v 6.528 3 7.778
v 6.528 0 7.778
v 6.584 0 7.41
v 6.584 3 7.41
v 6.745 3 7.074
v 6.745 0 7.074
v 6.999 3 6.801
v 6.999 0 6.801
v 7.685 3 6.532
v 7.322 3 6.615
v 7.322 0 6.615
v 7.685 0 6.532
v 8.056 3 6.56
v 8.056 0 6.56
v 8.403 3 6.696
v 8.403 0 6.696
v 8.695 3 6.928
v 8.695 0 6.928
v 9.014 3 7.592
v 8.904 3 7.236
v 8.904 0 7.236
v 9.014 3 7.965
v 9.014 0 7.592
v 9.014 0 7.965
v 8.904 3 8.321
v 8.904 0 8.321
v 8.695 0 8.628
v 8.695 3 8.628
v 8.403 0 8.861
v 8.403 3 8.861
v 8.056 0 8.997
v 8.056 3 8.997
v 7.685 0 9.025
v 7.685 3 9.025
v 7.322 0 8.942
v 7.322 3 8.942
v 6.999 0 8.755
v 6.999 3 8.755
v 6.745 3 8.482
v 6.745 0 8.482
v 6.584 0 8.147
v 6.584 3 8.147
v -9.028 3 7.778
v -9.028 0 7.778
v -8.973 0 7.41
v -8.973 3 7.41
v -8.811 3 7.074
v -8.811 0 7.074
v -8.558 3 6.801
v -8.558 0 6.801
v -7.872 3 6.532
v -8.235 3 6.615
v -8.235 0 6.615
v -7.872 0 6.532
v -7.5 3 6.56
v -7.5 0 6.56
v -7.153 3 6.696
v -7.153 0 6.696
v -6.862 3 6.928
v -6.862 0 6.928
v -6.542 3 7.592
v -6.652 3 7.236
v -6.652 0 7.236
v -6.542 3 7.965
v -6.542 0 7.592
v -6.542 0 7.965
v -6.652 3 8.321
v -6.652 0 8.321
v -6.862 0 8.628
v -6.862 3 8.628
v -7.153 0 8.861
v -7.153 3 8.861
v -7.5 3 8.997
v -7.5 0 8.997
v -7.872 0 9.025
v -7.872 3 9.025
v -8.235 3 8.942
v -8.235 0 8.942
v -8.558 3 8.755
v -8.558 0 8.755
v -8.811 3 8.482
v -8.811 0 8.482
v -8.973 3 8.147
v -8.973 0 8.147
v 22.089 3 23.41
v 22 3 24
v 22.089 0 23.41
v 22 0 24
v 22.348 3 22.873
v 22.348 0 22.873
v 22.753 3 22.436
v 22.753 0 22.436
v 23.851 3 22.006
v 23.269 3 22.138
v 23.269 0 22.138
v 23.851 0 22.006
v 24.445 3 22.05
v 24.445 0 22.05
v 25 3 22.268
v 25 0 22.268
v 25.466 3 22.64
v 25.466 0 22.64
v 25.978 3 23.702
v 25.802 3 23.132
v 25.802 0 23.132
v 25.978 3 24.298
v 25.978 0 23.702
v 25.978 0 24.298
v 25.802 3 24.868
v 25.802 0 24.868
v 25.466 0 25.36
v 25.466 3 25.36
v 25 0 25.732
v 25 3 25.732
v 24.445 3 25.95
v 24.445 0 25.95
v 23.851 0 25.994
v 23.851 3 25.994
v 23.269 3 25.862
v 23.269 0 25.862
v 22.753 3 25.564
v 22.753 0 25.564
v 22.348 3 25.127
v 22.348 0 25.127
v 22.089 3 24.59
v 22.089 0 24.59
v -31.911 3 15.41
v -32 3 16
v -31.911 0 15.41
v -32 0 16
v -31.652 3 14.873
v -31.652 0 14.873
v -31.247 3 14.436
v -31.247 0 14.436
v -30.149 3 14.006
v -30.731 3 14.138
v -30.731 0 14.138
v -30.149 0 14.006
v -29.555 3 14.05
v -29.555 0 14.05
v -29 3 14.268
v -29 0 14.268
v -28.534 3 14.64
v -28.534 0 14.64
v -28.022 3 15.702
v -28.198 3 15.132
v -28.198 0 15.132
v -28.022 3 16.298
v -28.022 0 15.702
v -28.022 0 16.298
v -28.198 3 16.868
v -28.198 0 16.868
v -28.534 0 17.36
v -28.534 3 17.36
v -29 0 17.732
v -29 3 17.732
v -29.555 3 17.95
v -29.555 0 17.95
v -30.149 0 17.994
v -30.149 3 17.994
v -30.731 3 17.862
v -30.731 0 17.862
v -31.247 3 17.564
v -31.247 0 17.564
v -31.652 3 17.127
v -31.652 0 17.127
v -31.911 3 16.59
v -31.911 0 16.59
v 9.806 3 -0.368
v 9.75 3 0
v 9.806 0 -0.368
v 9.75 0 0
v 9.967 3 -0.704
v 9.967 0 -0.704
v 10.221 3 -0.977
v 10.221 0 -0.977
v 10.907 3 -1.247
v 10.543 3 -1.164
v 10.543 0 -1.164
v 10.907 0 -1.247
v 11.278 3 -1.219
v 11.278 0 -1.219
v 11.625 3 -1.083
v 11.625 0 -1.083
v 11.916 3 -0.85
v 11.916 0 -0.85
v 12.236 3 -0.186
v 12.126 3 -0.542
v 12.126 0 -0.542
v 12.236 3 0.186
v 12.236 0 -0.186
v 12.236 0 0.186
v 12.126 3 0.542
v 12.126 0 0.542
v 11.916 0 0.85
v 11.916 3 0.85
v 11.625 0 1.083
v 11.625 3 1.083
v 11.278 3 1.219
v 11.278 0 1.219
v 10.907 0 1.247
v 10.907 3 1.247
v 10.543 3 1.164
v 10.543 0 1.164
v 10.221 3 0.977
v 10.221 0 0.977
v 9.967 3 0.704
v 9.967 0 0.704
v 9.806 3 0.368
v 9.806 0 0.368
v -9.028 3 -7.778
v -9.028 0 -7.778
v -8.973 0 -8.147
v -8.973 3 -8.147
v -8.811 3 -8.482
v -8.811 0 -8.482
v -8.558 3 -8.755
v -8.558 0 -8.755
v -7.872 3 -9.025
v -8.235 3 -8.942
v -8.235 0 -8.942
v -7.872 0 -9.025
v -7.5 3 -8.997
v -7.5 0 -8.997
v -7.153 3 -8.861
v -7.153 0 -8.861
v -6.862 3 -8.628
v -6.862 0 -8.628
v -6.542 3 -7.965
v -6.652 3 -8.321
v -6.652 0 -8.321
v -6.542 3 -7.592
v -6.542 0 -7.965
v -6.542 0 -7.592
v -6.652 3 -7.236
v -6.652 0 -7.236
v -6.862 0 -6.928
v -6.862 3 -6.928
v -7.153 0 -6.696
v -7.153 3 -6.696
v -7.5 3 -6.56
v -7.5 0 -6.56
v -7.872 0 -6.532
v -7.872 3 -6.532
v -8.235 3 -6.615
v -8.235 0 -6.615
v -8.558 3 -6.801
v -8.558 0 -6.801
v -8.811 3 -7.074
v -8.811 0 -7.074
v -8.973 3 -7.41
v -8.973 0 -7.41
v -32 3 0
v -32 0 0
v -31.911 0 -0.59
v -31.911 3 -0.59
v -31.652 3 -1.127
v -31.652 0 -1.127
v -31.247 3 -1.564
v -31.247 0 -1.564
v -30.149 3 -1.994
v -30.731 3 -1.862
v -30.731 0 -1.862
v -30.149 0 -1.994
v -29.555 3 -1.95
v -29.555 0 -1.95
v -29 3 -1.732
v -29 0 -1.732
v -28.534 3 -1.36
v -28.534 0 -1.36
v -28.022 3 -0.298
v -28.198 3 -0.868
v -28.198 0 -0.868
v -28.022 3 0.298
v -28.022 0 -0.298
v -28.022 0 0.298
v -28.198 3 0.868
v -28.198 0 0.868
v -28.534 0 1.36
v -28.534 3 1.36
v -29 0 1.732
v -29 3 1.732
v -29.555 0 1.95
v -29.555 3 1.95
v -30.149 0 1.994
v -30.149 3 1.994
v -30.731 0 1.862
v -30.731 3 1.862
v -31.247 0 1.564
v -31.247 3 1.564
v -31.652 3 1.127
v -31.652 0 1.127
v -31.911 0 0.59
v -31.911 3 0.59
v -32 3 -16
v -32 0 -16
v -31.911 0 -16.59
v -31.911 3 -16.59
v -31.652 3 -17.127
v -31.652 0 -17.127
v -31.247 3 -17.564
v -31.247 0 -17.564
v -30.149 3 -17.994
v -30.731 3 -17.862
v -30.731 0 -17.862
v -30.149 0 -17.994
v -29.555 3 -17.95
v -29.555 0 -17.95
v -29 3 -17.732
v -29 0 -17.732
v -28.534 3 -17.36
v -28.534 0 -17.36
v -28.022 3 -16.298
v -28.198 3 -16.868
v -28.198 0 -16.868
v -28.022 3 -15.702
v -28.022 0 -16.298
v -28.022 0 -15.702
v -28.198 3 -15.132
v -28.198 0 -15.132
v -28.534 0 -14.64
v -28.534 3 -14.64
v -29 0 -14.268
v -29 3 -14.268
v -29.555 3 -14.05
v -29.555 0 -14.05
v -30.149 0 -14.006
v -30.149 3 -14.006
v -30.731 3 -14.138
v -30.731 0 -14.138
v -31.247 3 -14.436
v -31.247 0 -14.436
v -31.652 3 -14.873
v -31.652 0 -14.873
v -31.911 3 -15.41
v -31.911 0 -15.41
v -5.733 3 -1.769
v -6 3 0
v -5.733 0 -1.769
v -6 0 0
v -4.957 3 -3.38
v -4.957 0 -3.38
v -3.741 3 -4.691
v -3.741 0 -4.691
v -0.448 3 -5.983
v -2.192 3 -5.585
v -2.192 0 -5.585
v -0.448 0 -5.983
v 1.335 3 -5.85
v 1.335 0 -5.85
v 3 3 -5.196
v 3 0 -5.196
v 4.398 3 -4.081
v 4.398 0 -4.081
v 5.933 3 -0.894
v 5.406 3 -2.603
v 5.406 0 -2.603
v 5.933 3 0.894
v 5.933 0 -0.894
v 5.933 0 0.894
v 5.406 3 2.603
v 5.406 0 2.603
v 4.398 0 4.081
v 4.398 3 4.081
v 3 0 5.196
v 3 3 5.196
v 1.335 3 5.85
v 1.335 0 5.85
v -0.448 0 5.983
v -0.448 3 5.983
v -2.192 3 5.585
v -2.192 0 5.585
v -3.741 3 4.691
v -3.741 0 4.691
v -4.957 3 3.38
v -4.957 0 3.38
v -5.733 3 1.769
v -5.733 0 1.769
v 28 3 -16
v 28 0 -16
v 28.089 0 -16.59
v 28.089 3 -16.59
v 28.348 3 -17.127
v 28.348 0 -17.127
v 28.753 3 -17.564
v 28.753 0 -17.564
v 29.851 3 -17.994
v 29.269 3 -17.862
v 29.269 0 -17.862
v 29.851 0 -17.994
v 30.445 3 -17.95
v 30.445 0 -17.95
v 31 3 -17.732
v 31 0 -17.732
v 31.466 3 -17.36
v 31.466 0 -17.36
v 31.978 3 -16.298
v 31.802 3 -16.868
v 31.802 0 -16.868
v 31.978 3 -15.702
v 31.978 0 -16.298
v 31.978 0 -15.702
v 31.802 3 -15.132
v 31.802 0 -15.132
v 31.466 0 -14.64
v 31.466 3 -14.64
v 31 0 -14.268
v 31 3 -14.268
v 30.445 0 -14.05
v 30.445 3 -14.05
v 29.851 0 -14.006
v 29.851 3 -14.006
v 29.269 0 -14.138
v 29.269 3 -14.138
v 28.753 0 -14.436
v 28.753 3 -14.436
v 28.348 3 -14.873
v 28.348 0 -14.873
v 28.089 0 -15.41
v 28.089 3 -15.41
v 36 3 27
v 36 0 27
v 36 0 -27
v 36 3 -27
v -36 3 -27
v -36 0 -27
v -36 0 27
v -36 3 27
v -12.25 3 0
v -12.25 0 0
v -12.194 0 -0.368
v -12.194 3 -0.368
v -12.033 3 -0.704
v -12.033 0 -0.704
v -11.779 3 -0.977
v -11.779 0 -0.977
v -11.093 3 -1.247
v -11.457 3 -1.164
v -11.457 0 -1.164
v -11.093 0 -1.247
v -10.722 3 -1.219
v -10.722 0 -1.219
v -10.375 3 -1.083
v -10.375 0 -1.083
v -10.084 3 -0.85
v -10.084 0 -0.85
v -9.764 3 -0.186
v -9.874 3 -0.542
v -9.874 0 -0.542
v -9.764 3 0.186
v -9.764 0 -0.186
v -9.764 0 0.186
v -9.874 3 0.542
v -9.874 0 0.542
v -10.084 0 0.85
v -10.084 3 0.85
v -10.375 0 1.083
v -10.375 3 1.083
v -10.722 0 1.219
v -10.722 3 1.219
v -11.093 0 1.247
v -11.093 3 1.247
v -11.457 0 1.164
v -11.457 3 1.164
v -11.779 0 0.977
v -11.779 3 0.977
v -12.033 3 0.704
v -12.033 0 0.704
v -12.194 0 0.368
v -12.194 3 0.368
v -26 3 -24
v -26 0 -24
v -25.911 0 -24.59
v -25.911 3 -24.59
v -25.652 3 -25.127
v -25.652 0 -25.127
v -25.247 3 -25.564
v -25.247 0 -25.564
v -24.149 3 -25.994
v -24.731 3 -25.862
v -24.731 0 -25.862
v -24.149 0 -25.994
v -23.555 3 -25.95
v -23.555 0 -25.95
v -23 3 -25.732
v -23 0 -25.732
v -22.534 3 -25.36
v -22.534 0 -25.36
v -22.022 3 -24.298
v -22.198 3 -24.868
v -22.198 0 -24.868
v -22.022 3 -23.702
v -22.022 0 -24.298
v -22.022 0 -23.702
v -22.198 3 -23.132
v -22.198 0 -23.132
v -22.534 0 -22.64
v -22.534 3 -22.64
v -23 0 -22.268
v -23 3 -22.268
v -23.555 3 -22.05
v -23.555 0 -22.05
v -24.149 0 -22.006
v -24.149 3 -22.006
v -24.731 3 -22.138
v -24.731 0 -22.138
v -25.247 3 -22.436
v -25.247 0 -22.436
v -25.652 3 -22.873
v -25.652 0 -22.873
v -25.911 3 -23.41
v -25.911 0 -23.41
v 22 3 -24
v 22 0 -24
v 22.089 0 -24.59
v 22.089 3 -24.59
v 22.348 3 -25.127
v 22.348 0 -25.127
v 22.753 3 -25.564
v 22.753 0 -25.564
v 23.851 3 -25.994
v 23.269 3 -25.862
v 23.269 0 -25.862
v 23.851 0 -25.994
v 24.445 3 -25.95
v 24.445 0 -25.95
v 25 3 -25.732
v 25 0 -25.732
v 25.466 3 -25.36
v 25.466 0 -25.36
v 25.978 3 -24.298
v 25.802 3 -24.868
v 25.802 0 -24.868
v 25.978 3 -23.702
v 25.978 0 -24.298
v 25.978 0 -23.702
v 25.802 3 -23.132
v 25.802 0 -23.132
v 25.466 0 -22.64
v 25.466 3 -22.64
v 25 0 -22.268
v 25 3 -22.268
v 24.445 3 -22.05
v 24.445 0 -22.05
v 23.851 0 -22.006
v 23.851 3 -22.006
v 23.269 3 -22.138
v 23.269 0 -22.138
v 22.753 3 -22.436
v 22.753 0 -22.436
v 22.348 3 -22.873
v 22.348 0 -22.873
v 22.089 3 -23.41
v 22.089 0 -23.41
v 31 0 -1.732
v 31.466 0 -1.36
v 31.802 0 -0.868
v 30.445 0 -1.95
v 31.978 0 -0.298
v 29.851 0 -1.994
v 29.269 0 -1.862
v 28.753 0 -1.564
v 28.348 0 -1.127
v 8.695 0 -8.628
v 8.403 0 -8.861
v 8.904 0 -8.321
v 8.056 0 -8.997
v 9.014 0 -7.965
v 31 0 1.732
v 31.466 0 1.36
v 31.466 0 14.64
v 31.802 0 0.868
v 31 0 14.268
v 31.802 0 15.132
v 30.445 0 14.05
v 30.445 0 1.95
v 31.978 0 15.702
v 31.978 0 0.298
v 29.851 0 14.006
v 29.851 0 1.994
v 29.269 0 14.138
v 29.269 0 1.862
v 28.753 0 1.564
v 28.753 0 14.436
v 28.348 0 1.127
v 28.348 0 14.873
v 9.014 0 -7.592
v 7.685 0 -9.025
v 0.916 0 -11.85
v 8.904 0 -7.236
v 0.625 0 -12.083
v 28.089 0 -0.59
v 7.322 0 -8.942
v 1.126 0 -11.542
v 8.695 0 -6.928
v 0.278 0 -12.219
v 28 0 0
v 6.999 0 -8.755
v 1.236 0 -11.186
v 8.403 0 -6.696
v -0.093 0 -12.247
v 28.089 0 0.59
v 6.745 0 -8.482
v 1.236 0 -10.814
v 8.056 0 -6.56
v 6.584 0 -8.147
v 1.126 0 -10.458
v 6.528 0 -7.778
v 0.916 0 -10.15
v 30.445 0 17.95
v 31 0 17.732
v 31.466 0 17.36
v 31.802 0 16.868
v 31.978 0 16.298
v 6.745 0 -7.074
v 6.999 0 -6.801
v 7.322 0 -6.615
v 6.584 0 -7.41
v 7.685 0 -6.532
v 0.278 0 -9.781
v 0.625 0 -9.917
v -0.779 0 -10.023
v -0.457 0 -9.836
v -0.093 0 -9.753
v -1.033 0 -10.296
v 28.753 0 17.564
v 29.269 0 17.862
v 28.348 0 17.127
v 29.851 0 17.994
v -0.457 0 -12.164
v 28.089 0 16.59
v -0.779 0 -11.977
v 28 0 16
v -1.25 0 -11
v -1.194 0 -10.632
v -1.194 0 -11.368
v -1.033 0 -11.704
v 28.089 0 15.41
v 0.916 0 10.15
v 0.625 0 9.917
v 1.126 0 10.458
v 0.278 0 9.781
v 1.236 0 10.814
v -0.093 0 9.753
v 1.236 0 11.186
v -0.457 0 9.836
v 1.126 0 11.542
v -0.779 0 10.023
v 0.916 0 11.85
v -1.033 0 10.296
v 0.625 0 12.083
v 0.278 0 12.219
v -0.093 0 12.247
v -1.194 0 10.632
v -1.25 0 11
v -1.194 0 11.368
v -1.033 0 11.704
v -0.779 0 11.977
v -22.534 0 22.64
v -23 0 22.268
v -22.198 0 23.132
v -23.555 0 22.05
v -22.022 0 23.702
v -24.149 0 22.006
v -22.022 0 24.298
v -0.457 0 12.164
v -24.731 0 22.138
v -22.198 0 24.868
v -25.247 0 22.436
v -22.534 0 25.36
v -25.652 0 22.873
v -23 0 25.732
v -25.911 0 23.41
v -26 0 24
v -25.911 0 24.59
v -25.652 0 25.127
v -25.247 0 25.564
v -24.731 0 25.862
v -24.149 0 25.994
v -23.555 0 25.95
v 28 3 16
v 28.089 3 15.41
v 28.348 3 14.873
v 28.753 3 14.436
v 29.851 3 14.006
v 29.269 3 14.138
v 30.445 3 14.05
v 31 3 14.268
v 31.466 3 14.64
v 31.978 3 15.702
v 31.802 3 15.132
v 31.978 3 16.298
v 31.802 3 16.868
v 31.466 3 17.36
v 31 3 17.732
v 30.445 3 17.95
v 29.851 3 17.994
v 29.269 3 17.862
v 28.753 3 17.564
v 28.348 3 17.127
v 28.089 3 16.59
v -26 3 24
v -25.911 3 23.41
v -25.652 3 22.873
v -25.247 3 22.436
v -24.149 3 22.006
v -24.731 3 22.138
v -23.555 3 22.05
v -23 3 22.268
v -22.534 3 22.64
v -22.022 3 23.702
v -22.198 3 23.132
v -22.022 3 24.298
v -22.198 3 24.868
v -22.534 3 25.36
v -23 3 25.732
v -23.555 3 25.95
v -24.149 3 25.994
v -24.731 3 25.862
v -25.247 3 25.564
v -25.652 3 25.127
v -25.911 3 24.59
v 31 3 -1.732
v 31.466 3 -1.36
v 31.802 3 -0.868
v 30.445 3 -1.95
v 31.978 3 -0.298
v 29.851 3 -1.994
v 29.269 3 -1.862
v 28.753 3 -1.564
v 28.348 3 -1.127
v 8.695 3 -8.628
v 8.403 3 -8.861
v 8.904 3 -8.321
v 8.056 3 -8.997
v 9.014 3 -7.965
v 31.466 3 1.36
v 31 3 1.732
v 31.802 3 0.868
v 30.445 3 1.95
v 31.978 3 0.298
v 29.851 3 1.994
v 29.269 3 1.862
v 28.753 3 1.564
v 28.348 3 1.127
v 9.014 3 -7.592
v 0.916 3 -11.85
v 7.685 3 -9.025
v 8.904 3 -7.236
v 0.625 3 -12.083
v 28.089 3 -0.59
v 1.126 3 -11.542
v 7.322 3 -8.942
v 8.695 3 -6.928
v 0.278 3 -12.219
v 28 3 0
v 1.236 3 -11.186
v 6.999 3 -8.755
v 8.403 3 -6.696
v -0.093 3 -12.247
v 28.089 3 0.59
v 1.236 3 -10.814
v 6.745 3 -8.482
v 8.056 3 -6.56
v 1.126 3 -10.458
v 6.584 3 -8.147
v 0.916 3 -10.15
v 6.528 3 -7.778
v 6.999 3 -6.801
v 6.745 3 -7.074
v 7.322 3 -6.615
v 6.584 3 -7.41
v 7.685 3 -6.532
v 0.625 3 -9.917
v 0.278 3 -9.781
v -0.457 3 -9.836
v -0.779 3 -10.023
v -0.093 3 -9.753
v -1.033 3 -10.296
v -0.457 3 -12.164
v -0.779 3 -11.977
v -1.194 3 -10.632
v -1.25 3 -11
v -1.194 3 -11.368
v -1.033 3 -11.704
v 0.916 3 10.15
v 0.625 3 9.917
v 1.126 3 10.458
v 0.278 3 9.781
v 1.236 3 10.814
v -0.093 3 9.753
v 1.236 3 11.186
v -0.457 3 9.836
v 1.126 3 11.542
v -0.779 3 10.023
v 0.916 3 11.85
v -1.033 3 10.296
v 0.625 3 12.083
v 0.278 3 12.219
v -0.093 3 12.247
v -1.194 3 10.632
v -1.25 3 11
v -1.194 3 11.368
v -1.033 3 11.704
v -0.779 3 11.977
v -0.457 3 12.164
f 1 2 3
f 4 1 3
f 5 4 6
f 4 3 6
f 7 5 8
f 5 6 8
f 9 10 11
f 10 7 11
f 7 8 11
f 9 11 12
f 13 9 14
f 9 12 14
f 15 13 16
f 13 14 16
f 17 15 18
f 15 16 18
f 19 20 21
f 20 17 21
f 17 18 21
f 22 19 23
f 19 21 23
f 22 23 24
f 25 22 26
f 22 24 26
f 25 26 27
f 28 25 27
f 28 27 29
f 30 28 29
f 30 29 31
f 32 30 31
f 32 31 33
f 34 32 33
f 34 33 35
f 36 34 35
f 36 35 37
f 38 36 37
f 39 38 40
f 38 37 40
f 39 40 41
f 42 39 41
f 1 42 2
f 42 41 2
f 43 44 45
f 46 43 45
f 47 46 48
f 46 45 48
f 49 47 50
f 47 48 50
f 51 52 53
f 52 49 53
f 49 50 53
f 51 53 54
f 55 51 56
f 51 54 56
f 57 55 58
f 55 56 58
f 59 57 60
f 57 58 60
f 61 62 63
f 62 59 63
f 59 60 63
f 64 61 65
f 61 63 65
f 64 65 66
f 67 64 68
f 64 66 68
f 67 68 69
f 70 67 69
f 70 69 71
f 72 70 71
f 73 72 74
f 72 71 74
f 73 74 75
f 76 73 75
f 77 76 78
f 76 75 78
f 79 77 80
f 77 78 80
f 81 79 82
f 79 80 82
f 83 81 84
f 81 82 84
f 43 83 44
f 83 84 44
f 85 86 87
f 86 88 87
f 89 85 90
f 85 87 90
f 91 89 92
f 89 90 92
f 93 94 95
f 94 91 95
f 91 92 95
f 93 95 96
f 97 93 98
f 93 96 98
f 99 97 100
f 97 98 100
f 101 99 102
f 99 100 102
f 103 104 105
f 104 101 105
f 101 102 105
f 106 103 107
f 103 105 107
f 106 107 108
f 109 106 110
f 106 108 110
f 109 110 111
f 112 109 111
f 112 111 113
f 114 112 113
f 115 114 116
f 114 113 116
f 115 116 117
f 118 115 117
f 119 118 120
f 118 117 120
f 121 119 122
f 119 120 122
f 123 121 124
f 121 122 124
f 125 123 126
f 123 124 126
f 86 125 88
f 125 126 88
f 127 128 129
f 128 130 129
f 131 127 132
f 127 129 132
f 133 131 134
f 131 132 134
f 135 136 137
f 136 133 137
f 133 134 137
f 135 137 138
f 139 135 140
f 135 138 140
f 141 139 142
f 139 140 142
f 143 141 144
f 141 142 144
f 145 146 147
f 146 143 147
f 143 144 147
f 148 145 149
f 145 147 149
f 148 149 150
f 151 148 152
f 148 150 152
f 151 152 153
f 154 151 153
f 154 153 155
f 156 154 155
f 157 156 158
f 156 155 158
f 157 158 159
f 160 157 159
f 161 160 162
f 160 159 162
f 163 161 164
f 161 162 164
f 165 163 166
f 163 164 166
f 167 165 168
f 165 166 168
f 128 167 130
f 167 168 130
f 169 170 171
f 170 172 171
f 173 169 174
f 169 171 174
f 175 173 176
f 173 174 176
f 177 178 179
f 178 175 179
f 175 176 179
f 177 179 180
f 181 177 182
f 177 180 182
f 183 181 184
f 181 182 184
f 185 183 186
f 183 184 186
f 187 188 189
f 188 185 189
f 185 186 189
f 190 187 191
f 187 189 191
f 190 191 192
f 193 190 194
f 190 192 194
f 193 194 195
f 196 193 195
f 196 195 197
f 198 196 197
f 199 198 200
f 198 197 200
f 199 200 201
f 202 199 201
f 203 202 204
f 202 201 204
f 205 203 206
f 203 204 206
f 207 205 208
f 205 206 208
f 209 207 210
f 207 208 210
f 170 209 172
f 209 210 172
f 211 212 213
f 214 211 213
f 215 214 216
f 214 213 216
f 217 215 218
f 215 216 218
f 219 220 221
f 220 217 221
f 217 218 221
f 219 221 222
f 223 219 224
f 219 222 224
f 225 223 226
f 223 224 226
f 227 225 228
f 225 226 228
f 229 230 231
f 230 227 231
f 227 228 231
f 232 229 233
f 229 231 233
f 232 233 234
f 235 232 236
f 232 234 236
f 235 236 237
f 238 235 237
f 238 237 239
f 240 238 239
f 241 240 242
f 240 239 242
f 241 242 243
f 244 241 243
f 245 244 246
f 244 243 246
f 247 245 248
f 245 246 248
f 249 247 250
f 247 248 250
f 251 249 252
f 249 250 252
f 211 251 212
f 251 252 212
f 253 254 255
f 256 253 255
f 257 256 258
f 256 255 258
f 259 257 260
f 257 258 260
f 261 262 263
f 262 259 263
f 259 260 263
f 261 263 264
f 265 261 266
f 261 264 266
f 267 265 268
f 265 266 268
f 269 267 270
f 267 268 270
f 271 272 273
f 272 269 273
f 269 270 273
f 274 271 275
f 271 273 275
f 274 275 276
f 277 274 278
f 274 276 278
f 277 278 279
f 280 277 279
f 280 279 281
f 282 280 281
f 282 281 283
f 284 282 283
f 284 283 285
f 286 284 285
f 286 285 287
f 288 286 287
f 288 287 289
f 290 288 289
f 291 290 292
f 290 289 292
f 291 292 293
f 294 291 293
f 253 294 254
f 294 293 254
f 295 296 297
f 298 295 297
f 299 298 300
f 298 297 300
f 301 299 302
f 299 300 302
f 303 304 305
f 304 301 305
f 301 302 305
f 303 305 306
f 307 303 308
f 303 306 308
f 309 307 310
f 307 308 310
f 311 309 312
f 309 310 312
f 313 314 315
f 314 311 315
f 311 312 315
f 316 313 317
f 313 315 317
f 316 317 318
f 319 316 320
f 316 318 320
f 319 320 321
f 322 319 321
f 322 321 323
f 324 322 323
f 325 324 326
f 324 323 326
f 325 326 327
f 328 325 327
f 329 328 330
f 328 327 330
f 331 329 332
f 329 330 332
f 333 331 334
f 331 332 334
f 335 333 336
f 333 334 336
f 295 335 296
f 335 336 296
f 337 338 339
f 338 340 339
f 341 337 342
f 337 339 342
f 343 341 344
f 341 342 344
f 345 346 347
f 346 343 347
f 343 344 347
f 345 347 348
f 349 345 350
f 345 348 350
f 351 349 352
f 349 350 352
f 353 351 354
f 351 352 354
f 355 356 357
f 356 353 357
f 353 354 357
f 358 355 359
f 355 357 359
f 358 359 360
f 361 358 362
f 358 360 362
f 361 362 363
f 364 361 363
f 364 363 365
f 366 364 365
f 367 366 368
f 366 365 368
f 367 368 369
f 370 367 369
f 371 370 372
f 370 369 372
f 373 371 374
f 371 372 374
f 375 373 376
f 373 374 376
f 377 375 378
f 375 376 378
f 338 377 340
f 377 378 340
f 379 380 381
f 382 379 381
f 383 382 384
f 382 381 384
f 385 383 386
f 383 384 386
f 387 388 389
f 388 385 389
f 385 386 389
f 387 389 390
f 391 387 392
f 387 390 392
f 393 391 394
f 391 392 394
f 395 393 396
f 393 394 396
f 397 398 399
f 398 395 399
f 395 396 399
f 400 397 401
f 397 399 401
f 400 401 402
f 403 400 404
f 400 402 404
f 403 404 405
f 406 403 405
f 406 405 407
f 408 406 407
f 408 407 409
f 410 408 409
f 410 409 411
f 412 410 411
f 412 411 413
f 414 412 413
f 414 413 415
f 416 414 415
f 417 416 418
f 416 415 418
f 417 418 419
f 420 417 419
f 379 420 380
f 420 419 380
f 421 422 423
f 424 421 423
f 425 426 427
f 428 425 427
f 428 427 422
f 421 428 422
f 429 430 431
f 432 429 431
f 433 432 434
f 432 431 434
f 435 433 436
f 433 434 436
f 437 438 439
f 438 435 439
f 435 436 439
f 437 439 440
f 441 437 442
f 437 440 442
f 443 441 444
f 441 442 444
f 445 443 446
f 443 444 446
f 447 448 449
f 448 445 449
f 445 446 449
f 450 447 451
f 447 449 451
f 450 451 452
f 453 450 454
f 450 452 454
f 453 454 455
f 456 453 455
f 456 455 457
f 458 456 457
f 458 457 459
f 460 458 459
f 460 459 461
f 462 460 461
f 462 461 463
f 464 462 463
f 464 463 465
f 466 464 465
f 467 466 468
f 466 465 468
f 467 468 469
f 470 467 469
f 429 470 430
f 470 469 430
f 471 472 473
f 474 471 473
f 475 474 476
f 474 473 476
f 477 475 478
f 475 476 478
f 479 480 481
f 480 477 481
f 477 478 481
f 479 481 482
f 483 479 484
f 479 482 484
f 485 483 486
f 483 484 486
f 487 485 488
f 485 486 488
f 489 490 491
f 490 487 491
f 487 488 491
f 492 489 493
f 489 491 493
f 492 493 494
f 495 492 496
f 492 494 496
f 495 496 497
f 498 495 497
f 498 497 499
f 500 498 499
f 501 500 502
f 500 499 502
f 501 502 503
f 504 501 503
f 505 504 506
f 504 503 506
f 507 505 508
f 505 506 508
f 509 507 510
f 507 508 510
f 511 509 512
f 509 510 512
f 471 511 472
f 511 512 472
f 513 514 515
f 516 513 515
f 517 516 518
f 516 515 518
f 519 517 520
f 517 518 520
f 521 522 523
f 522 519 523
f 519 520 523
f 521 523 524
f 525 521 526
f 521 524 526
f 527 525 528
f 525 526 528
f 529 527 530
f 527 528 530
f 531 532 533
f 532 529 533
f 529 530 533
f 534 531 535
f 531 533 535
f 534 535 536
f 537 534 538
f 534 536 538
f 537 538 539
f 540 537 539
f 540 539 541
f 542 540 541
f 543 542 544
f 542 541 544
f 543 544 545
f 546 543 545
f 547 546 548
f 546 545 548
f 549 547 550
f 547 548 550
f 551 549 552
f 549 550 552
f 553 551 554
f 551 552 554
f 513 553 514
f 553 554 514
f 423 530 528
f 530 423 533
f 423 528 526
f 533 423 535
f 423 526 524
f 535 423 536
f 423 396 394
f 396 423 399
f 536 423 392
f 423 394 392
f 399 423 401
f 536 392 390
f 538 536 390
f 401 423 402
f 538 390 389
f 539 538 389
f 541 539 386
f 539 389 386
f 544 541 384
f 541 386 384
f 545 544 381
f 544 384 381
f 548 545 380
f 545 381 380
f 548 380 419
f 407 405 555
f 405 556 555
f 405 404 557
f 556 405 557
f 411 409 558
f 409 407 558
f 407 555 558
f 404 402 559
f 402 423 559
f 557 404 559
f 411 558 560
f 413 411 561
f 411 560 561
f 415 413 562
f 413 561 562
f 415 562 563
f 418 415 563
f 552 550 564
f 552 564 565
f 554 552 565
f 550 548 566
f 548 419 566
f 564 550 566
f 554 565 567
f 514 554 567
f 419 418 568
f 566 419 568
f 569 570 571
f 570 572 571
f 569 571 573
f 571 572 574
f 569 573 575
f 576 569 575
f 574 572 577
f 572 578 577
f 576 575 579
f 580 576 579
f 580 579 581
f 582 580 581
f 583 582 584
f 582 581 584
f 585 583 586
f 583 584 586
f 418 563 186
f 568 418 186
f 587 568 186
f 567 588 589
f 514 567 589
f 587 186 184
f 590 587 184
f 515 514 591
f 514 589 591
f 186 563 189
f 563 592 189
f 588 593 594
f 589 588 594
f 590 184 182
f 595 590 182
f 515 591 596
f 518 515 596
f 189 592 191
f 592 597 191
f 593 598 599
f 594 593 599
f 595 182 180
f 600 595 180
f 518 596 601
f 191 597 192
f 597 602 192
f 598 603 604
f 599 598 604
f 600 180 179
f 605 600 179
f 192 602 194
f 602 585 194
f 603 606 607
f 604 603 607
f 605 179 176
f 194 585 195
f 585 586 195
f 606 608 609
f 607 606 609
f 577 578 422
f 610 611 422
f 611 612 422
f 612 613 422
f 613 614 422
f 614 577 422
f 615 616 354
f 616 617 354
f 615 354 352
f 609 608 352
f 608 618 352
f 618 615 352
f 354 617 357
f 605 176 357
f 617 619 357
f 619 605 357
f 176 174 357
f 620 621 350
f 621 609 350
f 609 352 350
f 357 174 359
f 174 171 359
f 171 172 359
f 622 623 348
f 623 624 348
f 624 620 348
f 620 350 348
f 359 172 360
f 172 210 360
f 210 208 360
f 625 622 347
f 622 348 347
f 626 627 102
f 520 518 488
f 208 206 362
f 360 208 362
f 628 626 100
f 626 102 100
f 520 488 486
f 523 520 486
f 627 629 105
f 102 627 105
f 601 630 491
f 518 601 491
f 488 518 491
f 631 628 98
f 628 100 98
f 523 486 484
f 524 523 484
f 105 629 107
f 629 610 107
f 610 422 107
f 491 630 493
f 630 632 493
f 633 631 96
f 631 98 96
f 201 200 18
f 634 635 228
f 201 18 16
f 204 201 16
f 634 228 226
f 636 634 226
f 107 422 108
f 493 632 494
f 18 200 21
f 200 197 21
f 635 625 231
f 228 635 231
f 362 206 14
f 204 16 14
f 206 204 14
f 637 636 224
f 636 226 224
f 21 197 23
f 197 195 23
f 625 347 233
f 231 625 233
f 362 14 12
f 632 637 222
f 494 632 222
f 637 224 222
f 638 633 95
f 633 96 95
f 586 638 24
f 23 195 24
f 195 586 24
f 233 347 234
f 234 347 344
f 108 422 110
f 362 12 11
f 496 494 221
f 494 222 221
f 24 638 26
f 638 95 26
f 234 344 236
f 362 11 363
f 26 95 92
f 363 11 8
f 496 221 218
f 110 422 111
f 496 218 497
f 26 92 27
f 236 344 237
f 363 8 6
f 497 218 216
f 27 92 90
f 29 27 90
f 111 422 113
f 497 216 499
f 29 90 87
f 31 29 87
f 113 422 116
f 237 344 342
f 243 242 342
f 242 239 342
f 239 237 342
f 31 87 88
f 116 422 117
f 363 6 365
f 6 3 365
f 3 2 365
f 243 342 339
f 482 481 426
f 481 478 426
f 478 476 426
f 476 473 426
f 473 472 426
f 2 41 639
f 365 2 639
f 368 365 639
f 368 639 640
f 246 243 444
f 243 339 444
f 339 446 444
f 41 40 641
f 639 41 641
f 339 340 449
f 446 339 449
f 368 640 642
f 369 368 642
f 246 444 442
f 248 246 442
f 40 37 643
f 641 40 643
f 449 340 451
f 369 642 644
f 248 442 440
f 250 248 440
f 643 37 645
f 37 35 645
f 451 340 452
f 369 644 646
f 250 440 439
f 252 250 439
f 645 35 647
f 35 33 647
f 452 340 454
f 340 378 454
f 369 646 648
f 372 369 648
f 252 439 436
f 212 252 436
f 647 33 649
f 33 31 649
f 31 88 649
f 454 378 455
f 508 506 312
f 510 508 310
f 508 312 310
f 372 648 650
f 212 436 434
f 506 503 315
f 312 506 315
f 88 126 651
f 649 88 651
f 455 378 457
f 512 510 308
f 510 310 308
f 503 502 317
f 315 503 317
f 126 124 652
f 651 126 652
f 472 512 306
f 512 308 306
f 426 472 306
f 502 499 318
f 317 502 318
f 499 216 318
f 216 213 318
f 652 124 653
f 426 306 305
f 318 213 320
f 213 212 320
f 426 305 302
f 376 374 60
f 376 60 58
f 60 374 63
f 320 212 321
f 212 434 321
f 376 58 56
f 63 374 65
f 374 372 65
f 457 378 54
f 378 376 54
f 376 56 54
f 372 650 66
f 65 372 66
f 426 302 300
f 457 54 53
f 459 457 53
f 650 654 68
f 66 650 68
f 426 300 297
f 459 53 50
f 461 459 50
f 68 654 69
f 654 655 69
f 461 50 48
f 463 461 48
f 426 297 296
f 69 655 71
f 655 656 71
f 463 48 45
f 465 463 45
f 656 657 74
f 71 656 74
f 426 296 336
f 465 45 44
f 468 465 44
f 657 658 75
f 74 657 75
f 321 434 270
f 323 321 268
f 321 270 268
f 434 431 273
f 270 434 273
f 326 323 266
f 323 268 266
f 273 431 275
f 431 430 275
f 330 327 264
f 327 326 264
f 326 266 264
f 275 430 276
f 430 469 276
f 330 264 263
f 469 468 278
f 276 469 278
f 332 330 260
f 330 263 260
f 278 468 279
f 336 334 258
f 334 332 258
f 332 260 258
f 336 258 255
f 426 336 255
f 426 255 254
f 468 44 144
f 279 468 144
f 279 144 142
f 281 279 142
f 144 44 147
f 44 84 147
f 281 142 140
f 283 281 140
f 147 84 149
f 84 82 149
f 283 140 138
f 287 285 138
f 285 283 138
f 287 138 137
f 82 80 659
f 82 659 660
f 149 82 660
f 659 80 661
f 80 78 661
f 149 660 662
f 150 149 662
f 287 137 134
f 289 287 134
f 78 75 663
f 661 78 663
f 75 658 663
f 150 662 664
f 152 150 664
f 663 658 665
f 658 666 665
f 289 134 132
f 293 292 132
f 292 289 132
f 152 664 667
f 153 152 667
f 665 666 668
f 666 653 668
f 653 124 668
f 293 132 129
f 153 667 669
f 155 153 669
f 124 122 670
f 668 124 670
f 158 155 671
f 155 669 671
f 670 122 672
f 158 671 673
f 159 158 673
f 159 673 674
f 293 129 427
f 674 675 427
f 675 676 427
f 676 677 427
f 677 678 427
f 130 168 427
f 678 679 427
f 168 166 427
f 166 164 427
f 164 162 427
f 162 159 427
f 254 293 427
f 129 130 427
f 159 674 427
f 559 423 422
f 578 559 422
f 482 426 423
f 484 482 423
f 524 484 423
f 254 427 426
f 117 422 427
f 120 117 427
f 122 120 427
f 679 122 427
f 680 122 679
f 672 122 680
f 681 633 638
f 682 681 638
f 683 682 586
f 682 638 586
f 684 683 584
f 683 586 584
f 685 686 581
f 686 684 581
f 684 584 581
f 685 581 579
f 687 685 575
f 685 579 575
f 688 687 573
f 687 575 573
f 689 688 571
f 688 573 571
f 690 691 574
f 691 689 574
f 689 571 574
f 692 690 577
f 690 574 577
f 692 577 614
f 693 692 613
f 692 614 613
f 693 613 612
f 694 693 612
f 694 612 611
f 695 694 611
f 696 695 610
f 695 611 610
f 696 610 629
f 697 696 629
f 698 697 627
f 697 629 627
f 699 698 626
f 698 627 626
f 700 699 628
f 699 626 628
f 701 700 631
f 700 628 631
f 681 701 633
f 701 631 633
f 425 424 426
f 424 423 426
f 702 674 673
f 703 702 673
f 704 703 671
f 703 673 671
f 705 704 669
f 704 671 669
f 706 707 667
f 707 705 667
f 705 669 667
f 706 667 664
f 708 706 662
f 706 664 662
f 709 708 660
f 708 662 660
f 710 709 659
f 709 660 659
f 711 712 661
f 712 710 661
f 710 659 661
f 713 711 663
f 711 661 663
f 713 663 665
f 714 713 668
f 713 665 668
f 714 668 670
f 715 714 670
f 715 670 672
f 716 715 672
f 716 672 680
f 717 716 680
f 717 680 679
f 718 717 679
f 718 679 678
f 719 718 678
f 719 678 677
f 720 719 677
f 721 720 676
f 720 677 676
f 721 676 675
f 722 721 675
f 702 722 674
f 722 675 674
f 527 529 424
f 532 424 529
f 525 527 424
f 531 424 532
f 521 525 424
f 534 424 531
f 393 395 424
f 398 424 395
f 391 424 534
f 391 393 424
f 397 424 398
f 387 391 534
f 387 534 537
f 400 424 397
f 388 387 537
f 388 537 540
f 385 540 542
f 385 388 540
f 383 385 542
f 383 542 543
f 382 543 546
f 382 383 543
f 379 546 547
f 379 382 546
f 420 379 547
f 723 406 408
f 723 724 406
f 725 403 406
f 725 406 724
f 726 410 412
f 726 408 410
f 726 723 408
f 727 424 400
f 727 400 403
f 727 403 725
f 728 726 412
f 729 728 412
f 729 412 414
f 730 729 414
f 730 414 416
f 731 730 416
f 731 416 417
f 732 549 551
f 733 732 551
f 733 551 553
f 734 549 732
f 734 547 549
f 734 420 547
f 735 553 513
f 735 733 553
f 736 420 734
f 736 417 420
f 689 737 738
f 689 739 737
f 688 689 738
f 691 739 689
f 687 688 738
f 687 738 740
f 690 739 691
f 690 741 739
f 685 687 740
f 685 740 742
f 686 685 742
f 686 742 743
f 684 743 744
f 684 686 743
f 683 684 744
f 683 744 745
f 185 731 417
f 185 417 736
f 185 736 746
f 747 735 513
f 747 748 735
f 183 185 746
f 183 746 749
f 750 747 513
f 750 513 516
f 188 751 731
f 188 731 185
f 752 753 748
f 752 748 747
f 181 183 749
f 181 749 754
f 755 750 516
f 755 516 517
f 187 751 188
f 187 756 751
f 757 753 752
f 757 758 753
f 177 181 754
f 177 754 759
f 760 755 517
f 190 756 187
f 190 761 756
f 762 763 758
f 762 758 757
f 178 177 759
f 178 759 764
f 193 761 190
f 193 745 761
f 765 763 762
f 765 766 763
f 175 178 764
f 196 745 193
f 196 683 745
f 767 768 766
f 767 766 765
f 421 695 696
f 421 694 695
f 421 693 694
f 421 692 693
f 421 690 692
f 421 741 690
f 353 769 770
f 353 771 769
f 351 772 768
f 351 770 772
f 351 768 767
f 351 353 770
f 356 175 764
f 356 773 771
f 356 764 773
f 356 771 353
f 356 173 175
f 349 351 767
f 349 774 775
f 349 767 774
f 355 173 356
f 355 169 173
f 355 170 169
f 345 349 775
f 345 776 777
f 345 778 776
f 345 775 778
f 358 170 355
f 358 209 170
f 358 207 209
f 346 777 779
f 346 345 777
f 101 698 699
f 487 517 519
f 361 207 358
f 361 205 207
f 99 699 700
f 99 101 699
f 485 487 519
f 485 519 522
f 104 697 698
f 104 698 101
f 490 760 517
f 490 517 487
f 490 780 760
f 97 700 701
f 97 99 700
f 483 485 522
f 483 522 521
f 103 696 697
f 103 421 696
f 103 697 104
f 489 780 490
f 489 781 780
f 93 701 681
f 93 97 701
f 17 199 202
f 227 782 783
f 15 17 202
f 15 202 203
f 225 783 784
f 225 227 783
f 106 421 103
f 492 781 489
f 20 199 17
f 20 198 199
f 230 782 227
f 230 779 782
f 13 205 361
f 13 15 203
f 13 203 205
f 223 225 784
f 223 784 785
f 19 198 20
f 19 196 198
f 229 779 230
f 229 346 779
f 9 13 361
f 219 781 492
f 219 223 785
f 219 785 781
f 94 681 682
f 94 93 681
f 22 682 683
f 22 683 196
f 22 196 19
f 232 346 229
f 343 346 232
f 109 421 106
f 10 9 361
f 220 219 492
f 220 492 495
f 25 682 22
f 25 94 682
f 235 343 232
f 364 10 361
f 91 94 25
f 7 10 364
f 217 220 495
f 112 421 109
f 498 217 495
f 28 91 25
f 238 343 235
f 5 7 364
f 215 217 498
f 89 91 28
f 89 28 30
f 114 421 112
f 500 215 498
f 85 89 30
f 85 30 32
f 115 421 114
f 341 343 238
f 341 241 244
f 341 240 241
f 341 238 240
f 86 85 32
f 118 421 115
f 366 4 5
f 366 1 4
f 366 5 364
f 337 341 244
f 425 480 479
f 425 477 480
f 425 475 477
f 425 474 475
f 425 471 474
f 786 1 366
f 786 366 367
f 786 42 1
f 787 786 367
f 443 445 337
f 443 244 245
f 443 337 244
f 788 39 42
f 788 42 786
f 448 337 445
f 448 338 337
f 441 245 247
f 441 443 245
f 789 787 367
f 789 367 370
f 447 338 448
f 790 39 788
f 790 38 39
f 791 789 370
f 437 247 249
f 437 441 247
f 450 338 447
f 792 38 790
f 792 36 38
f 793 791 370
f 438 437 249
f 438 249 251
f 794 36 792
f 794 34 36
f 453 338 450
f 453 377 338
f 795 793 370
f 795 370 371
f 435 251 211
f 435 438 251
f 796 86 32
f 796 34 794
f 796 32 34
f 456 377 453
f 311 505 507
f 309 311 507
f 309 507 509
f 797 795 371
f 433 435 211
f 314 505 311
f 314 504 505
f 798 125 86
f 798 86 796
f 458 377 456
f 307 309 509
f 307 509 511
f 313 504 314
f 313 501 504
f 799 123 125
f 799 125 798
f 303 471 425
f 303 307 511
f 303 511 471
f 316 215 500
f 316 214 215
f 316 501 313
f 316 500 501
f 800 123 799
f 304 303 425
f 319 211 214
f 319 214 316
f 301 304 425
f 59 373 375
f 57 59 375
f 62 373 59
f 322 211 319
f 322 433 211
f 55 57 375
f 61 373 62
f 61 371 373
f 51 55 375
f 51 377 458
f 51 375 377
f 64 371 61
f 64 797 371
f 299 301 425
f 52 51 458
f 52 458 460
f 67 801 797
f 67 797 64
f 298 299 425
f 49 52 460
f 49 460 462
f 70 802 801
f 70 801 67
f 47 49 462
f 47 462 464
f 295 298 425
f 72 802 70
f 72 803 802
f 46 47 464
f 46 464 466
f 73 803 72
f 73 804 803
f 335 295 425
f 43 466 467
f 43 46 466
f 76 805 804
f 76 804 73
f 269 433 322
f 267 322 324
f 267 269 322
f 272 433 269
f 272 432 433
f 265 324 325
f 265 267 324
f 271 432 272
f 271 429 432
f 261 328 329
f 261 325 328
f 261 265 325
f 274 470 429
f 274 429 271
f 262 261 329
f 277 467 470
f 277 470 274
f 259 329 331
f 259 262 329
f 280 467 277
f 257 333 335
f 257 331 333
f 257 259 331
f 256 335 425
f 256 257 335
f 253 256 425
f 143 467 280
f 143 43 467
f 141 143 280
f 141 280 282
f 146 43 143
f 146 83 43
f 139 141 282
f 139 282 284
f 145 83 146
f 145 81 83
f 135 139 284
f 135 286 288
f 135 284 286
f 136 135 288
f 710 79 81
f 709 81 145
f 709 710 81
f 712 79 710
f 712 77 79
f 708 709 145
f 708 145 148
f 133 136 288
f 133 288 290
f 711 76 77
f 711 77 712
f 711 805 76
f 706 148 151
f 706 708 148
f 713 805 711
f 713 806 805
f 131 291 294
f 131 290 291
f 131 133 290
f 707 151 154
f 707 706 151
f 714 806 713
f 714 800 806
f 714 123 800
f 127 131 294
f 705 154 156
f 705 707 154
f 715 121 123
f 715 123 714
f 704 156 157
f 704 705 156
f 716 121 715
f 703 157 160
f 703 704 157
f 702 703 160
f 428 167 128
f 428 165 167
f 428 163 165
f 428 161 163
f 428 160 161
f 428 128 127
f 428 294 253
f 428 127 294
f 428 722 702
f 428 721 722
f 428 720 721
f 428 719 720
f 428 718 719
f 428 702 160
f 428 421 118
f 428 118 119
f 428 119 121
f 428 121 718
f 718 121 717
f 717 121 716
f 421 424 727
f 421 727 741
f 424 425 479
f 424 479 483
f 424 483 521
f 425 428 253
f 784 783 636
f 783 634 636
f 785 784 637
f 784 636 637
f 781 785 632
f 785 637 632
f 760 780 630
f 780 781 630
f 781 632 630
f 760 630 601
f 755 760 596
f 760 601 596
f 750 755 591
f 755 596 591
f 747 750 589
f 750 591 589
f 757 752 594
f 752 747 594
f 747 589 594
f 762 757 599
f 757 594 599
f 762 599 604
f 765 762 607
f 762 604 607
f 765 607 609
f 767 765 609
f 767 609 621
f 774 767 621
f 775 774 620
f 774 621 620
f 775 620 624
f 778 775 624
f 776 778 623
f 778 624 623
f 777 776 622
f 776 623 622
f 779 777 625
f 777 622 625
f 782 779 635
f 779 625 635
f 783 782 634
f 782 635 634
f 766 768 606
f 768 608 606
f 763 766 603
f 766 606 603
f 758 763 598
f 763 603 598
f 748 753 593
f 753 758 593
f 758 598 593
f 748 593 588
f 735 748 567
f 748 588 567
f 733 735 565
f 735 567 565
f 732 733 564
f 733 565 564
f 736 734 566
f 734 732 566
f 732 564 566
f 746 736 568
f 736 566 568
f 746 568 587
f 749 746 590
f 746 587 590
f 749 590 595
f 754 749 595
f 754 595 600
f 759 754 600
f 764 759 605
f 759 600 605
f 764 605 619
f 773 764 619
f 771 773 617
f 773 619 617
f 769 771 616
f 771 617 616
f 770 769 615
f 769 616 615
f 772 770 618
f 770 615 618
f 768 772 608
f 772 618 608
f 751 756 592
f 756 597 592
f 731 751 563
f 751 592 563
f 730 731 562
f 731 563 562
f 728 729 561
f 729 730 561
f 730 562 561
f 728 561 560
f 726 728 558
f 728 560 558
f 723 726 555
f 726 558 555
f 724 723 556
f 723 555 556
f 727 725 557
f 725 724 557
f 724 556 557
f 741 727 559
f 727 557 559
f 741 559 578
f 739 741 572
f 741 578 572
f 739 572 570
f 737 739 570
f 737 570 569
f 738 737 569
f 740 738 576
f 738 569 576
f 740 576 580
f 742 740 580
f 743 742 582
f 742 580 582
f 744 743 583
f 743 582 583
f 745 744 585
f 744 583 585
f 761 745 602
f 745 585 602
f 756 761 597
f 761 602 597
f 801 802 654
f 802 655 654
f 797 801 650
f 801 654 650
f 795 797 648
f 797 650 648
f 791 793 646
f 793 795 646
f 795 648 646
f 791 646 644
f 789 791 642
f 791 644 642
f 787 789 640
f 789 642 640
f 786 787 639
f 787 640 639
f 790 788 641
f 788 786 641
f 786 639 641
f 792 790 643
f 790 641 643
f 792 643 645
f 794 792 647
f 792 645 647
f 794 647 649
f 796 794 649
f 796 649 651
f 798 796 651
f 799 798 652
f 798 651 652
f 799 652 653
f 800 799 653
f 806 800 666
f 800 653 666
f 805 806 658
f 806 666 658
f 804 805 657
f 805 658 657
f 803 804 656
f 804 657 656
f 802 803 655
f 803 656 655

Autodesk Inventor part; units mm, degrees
ref_plane "YZ Plane" through (0, 0, 0) normal (1, 0, 0) x (0, 1, 0)
ref_plane "XZ Plane" through (0, 0, 0) normal (0, 1, 0) x (-1, 0, 0)
ref_plane "XY Plane" through (0, 0, 0) normal (0, 0, 1) x (1, 0, 0)
sketch "Sketch1" plane through (0, 0, 0) normal (0, 1, 0) x (-1, 0, 0)
  line L0 (36, 27) -> (-36, 27)
  line L1 (-36, 27) -> (-36, -27)
  line L2 (-36, -27) -> (36, -27)
  line L3 (36, -27) -> (36, 27)
  line L4 (36, 27) -> (-36, -27) construction
  line L5 (-36, 27) -> (36, -27) construction
  circle A0 centre (0, 0) radius 6
  circle A1 centre (0, -11) radius 1.25
  circle A2 centre (7.7782, -7.7782) radius 1.25
  circle A3 centre (11, 0) radius 1.25
  circle A4 centre (7.7782, 7.7782) radius 1.25
  circle A5 centre (0, 11) radius 1.25
  circle A6 centre (-7.7782, 7.7782) radius 1.25
  circle A7 centre (-11, 0) radius 1.25
  circle A8 centre (-7.7782, -7.7782) radius 1.25
  circle A9 centre (24, -24) radius 2
  line L6 (0, 0) -> (0, 6) construction
  circle A10 centre (-24, -24) radius 2
  line L7 (0, 0) -> (-36, 0) construction
  circle A11 centre (24, 24) radius 2
  circle A12 centre (-24, 24) radius 2
  circle A13 centre (30, 16) radius 2
  circle A14 centre (-30, 16) radius 2
  circle A15 centre (30, -16) radius 2
  circle A16 centre (-30, -16) radius 2
  circle A17 centre (-30, 0) radius 2
  circle A18 centre (30, 0) radius 2
  dimension "d2" = 12
  dimension "d0" = 72
  dimension "d1" = 54
  dimension "d3" = 2.5
  dimension "d4" = 11
  dimension "d7" = 360
  dimension "d9" = 4
  dimension "d10" = 24
  dimension "d11" = 24
  dimension "d14" = 4
  dimension "d15" = 6
  dimension "d16" = 8
  dimension "d17" = 4
  dimension "d18" = 4
extrude "Extrusion1" add sketch "Sketch1" along normal blind 3
properties part number "FifthAxisServoPlate"
